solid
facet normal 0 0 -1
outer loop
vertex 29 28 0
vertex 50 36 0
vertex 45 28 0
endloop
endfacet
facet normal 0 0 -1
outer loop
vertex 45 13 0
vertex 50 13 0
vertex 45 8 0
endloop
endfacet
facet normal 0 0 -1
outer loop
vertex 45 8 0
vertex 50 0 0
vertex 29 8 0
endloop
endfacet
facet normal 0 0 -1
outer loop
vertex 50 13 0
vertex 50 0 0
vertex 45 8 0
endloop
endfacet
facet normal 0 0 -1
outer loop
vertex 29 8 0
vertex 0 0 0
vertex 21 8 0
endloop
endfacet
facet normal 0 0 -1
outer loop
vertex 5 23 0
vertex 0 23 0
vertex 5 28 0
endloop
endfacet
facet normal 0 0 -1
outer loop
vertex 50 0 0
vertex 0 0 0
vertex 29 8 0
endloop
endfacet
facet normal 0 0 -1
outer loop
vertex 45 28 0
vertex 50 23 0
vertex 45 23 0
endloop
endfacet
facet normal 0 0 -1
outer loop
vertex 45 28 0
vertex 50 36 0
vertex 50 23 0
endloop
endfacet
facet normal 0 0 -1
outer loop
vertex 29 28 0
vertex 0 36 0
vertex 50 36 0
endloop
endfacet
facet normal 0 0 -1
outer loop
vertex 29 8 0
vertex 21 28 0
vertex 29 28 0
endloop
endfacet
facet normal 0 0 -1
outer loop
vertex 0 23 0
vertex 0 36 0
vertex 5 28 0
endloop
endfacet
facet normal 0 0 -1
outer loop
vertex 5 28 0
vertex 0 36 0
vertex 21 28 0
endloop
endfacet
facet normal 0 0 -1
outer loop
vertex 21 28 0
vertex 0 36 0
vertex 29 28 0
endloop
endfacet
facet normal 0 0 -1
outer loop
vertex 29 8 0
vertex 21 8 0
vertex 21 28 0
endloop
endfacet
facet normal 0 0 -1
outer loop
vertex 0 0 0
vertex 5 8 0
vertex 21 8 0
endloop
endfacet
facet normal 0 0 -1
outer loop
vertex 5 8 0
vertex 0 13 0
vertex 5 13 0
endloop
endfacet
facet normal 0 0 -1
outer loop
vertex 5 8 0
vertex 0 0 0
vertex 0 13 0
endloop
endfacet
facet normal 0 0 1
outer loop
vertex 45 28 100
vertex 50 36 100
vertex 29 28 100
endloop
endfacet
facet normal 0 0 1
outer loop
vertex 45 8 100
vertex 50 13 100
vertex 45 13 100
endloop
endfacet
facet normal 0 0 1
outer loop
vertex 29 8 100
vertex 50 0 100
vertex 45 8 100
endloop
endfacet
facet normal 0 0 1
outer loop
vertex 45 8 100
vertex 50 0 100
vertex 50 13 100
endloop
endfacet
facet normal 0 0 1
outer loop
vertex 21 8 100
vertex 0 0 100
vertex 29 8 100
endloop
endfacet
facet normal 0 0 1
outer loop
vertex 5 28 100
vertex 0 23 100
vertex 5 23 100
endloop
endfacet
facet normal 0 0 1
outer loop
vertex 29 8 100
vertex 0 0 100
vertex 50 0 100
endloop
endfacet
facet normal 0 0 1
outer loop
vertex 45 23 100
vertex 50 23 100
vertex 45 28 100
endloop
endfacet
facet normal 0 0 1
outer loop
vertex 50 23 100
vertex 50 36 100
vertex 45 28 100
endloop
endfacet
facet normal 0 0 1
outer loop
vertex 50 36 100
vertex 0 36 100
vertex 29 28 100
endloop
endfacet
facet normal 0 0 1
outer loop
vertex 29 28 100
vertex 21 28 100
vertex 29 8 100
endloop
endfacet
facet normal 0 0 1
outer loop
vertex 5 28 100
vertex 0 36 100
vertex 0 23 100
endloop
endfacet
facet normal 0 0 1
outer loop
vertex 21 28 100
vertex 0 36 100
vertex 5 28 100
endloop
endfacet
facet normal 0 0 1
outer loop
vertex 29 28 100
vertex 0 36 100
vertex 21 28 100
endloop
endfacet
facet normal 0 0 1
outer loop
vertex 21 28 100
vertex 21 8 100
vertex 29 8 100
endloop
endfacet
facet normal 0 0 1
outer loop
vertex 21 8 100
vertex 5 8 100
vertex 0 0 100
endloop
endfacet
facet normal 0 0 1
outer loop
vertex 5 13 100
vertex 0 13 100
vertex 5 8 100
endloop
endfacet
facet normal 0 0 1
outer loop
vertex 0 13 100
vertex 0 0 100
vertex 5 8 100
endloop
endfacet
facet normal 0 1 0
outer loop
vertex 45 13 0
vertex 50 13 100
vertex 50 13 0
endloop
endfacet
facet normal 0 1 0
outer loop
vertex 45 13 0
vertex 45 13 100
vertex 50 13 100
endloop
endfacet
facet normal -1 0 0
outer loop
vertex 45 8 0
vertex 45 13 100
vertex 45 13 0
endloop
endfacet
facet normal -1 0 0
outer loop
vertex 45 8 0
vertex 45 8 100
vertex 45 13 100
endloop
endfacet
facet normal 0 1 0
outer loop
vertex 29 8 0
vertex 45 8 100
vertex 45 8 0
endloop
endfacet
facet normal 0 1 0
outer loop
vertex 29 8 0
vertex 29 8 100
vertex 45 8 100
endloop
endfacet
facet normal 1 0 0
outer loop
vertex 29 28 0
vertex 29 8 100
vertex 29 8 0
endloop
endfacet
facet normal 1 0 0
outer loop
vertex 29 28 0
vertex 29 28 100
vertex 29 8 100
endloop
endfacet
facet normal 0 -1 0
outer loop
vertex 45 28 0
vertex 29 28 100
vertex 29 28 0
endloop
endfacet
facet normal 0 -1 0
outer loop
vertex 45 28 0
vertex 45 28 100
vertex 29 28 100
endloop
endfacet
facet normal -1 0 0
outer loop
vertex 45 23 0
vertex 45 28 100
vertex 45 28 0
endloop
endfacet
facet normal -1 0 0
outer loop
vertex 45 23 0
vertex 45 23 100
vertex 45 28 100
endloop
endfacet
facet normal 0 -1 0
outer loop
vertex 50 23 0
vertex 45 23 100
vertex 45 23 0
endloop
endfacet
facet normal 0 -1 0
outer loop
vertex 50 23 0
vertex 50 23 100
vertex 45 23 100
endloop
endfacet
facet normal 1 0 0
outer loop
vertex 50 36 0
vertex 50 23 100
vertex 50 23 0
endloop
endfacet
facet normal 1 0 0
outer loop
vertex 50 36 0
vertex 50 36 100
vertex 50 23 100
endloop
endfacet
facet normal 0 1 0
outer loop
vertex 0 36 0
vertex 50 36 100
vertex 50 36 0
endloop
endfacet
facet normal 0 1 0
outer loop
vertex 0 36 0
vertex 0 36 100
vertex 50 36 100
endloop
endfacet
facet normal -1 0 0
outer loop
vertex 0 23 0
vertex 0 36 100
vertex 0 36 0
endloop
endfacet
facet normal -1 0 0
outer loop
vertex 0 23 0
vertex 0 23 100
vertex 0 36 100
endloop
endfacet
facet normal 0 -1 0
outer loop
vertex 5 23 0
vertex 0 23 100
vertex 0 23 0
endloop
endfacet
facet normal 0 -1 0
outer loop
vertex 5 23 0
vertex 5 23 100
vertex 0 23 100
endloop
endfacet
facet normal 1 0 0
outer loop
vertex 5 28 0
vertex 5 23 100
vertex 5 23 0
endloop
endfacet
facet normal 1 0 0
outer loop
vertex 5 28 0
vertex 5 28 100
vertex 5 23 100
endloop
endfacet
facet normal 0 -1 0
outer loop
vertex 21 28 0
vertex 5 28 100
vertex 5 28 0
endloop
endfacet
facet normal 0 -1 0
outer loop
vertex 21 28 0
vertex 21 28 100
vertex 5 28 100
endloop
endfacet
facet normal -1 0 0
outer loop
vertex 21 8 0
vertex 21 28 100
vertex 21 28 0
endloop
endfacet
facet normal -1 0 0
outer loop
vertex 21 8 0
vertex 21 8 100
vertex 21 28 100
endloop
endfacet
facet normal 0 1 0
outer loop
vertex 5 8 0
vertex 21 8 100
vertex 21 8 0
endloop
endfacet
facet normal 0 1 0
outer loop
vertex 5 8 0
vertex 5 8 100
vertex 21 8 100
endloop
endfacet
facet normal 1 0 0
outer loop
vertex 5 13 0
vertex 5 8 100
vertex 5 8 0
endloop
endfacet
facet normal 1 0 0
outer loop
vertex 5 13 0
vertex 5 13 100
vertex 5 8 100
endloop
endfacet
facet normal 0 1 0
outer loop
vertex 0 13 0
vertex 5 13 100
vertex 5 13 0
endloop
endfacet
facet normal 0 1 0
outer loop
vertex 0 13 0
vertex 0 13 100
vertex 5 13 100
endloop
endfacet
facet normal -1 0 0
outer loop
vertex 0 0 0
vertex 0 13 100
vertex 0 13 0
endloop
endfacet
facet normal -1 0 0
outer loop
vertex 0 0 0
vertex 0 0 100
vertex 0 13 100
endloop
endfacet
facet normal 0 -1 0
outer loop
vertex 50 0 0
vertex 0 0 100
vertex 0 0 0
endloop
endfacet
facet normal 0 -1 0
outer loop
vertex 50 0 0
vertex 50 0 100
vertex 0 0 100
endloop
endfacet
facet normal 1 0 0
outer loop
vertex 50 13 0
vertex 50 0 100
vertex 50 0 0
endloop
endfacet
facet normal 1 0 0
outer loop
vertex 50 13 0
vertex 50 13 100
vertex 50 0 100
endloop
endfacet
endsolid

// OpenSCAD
$fn = 32;

// ----------------------------------------------------------------------
// T-slot rail: 50 x 36 mm section, 100 mm long
// ----------------------------------------------------------------------

// --- parameters (mm) ---
profile_height = 100;     // extrusion height
profile_points = 20;      // points of the closed outline

profile = [[0, 0], [50, 0], [50, 13], [45, 13], [45, 8], [29, 8], [29, 28], [45, 28], [45, 23], [50, 23], [50, 36], [0, 36], [0, 23], [5, 23], [5, 28], [21, 28], [21, 8], [5, 8], [5, 13], [0, 13]];  // single closed polygon, 20 points, counter clockwise

// --- the one profile operation ---
linear_extrude(height = profile_height) polygon(points = profile);
